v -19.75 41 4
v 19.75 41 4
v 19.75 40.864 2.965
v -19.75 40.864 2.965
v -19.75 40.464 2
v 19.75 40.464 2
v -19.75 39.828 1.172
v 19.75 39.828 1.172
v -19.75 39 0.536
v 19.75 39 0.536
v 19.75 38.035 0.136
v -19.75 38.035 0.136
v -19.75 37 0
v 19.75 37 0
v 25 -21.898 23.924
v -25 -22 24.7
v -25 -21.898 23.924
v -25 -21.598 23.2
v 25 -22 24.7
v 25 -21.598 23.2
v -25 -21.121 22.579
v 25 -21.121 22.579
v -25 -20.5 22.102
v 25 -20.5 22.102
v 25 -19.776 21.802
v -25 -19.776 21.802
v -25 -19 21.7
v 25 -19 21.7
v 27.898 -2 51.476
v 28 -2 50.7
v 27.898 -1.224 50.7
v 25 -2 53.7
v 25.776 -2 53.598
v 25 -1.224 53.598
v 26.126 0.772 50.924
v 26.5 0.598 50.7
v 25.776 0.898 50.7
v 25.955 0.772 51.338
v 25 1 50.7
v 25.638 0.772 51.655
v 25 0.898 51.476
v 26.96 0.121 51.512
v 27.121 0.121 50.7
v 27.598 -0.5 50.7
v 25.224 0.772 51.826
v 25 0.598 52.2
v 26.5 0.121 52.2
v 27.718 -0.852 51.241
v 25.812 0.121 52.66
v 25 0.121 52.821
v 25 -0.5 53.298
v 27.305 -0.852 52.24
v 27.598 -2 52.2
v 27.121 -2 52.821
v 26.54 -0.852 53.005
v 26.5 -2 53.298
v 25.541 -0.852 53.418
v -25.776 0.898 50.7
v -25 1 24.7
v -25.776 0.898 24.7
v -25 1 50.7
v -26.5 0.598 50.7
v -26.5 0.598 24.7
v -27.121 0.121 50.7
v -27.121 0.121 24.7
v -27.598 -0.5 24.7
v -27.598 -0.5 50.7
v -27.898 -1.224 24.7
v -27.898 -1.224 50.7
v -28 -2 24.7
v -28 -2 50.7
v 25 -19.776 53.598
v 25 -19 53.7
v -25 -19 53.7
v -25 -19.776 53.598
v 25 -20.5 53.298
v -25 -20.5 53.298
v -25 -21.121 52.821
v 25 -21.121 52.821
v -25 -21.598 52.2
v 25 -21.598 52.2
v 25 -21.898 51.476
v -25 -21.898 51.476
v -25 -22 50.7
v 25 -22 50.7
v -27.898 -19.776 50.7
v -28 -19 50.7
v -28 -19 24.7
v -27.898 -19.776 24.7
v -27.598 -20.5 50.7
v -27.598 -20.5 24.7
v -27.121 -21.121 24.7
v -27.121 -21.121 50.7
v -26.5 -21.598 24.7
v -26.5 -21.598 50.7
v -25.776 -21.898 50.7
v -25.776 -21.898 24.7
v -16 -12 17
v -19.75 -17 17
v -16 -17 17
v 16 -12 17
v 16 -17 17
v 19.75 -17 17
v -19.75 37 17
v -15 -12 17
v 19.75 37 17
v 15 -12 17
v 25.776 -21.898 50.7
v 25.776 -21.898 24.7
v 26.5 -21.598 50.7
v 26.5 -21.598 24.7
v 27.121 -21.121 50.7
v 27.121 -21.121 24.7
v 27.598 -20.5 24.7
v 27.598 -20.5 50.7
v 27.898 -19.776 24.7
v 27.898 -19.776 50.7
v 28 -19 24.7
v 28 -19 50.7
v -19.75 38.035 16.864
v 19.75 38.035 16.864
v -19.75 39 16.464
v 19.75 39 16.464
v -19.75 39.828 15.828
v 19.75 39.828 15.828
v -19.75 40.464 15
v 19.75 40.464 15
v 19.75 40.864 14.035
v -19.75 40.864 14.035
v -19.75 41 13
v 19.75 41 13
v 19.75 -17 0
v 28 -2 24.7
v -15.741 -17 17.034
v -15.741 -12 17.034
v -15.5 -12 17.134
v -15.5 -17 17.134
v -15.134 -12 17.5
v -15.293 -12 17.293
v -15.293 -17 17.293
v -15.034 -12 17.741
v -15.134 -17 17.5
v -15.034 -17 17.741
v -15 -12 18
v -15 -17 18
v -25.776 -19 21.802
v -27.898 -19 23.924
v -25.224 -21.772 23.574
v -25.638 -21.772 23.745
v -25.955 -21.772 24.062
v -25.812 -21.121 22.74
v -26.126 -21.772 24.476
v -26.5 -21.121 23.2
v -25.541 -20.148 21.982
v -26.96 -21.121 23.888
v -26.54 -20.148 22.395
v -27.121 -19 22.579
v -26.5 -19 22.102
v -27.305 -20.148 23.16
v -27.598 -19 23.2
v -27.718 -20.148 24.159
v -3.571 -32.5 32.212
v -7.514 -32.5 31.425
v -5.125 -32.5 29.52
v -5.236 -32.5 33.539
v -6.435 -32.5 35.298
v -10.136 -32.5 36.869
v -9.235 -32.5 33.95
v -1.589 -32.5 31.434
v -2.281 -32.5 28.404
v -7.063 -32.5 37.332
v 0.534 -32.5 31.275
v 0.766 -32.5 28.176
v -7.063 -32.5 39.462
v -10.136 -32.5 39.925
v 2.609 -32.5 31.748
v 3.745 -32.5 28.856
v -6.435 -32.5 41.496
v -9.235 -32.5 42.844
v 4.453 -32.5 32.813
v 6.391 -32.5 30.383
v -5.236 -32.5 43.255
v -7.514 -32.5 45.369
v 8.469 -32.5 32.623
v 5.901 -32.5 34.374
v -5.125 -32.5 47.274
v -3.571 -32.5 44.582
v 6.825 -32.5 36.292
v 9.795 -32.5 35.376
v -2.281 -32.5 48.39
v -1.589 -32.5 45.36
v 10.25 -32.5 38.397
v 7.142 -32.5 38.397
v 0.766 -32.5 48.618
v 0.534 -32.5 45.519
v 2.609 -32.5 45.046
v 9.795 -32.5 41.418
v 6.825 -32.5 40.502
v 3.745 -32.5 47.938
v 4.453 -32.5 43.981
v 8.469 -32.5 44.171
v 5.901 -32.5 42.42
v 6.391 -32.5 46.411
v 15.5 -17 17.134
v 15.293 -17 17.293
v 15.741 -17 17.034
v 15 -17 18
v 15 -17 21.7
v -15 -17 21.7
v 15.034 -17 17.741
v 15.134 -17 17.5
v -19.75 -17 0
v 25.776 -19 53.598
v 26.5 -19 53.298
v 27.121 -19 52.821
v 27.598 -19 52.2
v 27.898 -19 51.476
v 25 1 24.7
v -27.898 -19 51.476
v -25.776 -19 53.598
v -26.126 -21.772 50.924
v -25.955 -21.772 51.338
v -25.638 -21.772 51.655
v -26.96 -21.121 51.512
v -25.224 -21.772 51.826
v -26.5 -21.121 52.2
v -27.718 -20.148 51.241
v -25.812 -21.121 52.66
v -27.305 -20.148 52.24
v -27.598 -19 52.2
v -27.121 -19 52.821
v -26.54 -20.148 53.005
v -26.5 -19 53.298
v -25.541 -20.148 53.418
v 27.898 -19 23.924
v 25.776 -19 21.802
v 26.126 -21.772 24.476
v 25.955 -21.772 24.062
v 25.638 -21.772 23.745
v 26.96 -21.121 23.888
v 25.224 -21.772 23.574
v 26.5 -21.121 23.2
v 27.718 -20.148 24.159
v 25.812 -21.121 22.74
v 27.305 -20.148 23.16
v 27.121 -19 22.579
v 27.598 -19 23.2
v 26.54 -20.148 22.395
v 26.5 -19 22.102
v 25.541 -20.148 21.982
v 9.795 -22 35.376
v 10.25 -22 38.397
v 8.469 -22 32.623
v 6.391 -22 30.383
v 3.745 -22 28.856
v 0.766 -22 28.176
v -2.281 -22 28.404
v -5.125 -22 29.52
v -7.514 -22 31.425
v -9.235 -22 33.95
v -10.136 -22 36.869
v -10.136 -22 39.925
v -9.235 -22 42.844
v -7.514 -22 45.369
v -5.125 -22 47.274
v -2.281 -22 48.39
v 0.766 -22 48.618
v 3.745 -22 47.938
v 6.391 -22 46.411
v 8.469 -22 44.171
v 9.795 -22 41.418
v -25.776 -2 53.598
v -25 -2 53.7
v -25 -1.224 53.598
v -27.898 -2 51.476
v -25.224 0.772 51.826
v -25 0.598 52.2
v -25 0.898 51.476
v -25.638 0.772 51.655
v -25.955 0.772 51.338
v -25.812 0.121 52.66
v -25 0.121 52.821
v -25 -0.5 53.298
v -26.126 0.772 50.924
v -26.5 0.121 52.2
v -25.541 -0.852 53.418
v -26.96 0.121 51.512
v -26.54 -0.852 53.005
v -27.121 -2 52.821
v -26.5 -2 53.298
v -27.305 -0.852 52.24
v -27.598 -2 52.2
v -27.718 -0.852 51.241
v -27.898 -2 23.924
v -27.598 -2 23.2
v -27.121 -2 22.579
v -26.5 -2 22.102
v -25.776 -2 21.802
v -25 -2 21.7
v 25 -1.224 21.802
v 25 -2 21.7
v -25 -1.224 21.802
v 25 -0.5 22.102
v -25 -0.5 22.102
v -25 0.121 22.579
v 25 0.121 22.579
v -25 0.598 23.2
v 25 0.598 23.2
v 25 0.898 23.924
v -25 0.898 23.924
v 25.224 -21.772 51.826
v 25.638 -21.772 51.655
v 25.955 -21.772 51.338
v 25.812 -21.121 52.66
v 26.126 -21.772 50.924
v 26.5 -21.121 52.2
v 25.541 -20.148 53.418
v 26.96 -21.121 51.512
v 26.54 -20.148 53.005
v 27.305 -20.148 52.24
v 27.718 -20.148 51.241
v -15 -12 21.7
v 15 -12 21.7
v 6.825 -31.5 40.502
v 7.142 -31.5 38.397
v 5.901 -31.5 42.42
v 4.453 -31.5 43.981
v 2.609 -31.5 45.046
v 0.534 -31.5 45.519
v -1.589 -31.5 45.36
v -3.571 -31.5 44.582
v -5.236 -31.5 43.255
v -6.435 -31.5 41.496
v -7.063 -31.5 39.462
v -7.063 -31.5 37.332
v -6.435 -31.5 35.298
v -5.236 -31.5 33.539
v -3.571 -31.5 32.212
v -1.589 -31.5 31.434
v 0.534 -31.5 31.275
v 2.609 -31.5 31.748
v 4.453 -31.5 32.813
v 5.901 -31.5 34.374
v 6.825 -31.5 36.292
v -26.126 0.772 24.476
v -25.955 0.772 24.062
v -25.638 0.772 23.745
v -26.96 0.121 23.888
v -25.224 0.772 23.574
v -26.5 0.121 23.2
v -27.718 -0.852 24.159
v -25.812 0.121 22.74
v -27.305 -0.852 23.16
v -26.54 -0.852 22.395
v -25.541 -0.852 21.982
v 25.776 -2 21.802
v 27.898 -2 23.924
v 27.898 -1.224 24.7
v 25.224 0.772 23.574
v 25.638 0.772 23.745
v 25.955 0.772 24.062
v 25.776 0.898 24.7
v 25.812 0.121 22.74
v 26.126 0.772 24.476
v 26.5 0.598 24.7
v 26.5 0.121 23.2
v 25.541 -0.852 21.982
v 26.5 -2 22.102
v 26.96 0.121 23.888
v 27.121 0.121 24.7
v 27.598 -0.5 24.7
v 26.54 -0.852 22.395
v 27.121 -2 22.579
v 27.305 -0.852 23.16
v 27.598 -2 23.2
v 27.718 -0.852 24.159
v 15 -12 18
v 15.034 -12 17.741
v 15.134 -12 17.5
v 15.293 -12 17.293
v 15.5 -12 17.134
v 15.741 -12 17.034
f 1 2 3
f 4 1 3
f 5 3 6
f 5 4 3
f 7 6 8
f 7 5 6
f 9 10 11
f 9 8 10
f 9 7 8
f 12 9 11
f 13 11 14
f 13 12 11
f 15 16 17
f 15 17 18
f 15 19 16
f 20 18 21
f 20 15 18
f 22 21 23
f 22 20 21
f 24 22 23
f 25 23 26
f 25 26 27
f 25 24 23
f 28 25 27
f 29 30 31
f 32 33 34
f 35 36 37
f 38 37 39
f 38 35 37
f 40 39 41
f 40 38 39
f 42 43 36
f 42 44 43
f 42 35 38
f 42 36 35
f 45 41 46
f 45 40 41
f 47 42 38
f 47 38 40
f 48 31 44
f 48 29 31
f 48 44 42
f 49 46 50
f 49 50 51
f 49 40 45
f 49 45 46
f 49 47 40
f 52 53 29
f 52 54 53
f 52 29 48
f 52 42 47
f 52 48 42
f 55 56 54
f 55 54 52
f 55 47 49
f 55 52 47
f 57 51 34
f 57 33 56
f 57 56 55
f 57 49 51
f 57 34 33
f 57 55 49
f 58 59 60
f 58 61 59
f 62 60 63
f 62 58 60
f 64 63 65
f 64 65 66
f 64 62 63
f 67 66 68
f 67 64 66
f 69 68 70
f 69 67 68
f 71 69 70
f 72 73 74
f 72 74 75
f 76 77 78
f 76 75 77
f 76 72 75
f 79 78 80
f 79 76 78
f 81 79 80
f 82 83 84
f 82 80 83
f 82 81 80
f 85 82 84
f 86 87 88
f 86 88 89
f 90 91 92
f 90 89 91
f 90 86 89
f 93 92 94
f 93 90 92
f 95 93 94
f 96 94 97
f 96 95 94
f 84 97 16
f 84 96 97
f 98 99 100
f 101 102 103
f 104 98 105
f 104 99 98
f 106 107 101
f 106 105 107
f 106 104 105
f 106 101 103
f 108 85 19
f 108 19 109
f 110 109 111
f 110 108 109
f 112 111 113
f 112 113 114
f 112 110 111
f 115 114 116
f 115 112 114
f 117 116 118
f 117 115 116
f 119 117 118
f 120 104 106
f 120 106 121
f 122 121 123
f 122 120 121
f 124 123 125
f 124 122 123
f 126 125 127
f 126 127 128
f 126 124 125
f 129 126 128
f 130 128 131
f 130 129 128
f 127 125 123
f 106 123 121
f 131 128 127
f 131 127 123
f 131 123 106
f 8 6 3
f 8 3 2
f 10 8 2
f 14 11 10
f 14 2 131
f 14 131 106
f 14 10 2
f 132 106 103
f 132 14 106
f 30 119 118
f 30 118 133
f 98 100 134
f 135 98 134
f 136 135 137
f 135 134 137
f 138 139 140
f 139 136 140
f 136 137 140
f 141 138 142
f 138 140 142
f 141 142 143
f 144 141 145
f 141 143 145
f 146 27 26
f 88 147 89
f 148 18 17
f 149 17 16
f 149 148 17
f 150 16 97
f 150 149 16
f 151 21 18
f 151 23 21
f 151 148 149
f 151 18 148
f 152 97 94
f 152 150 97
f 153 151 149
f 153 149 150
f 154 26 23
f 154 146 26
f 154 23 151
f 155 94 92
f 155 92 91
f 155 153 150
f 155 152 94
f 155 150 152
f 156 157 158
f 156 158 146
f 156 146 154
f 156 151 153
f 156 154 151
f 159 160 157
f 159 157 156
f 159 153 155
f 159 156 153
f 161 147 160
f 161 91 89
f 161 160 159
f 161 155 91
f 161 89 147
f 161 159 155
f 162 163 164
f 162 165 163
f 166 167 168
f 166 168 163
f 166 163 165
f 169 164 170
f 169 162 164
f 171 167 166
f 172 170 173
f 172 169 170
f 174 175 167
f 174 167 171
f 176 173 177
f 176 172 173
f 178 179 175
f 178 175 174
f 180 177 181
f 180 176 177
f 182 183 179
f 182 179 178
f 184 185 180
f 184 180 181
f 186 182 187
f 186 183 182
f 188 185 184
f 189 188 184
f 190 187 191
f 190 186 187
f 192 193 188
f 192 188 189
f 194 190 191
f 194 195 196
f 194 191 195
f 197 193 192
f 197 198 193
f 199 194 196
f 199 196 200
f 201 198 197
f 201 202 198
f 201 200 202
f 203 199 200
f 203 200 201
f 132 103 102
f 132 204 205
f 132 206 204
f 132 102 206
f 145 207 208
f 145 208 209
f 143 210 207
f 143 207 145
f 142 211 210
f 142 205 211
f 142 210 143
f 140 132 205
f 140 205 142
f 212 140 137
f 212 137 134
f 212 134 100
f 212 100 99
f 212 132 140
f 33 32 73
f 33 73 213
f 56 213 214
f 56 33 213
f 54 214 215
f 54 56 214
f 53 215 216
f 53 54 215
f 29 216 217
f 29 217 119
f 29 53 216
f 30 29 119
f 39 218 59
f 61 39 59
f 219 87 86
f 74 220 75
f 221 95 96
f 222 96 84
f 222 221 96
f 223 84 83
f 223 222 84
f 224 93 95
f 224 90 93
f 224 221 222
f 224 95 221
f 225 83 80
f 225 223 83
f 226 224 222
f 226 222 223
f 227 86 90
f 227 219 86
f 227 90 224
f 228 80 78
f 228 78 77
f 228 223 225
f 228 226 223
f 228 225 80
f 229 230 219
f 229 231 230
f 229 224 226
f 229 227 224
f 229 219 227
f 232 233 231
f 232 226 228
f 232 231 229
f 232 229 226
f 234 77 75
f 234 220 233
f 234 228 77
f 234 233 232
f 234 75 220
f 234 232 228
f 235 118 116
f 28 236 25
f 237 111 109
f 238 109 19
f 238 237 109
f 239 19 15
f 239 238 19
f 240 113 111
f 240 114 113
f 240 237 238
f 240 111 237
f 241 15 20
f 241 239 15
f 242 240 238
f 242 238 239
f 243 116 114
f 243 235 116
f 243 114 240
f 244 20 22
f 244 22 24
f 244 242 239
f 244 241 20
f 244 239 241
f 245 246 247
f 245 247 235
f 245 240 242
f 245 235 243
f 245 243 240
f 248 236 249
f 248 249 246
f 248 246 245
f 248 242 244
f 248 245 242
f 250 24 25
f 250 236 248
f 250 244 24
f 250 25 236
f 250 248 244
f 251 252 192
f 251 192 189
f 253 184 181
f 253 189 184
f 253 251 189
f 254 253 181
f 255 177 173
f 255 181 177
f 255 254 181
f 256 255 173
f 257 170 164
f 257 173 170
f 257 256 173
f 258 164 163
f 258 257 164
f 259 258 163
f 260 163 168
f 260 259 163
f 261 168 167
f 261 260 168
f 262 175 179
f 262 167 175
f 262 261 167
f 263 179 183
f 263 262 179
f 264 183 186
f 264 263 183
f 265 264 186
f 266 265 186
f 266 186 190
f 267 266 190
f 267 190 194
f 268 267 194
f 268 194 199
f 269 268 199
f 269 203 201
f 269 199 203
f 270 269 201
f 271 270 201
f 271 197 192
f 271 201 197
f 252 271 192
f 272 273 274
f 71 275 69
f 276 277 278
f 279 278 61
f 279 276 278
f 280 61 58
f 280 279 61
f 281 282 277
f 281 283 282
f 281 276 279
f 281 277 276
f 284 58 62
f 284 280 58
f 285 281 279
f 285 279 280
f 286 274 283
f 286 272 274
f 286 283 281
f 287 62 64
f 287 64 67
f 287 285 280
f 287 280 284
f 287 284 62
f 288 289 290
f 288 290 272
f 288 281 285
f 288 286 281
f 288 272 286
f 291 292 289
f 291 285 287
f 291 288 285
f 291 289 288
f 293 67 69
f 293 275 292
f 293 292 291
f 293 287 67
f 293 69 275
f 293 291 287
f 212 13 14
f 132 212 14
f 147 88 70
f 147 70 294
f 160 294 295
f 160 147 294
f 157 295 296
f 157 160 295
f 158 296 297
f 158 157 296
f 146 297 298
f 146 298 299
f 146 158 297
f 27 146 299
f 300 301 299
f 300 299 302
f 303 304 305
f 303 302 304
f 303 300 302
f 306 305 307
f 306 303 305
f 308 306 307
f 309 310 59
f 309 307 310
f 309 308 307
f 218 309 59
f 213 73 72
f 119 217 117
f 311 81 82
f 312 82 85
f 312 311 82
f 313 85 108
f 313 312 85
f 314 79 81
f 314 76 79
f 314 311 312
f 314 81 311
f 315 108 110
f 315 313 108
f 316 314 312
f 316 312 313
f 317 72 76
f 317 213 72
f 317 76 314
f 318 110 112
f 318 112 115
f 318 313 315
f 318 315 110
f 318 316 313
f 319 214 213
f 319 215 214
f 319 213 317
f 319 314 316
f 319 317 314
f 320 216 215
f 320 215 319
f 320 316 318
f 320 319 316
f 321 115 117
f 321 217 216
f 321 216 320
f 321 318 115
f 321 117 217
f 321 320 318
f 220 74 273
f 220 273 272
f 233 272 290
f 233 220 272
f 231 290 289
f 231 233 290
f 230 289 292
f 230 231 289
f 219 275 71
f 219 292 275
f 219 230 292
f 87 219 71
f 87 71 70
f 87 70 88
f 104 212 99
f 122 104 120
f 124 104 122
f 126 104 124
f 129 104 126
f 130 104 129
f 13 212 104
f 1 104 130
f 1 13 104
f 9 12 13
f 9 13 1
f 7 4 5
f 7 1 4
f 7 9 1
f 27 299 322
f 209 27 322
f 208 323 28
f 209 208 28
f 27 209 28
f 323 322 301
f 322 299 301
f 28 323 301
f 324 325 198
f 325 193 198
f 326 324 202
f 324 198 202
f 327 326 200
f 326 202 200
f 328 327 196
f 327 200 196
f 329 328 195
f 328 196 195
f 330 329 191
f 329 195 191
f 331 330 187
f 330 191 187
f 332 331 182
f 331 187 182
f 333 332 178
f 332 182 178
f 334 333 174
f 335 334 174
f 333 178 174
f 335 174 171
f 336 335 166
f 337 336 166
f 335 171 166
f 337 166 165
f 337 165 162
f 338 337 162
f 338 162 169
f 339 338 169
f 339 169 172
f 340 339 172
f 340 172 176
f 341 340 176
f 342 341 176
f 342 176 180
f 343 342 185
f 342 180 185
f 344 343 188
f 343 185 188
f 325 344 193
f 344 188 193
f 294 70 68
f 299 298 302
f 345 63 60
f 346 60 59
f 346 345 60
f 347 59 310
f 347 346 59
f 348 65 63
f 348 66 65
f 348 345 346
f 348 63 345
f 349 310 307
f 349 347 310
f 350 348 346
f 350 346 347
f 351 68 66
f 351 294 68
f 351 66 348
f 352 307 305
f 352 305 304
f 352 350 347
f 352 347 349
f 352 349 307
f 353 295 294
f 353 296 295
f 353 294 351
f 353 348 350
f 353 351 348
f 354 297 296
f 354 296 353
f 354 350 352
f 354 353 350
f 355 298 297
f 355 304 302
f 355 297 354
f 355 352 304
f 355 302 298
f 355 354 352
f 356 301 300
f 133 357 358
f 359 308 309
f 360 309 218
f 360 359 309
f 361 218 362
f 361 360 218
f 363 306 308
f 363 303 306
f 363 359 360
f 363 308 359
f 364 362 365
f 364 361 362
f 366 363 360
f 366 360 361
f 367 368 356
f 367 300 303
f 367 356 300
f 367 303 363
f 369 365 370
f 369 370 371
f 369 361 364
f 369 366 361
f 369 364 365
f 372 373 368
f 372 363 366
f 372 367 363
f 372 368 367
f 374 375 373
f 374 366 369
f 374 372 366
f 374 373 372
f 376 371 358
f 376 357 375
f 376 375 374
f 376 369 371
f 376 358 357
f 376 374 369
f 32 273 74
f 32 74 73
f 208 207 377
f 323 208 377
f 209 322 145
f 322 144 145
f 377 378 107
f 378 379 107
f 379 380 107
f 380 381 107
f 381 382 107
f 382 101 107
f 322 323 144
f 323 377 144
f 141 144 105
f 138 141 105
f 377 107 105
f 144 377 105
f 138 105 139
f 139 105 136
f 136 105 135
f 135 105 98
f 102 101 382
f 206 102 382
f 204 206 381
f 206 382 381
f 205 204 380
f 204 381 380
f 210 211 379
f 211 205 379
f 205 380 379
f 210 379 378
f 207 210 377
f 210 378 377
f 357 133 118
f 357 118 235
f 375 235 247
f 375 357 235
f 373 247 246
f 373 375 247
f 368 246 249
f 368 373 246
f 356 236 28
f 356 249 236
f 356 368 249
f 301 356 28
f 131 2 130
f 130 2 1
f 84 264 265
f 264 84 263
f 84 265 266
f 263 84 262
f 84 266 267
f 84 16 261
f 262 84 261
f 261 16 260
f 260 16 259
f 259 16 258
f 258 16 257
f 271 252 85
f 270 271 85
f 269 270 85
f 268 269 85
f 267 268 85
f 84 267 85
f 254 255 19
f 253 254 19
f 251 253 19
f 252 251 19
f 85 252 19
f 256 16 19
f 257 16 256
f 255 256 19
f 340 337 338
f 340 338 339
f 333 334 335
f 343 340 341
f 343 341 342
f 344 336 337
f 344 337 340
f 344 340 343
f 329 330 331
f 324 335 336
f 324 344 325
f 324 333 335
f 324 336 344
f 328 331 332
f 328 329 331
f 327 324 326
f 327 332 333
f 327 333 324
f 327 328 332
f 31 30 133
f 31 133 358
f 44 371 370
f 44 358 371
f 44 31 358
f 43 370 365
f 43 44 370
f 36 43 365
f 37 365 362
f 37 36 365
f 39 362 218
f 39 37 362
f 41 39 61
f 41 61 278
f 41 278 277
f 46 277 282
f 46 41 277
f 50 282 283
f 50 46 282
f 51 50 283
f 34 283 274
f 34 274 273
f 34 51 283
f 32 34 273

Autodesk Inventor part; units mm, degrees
ref_plane "YZ Plane" through (0, 0, 0) normal (1, 0, 0) x (0, 1, 0)
ref_plane "XZ Plane" through (0, 0, 0) normal (0, 1, 0) x (-1, 0, 0)
ref_plane "XY Plane" through (0, 0, 0) normal (0, 0, 1) x (1, 0, 0)
sketch "Sketch1" plane through (0, 0, 0) normal (0, 0, 1) x (1, 0, 0)
  circle A0 centre (0, 17) radius 3.1 projected
  line L0 (19.75, -8) -> (-19.75, -8) projected
  line L1 (19.75, 33) -> (19.75, -8) projected
  line L2 (-19.75, 33) -> (19.75, 33) projected
  line L3 (-19.75, -8) -> (-19.75, 33) projected
  line L4 (-19.75, -8) -> (19.75, -8)
  line L5 (19.75, -8) -> (19.75, -17)
  line L6 (19.75, -17) -> (-19.75, -17)
  line L7 (-19.75, -17) -> (-19.75, -8)
  line L8 (-19.75, 33) -> (19.75, 33)
  line L9 (19.75, 33) -> (19.75, 41)
  line L10 (19.75, 41) -> (-19.75, 41)
  line L11 (-19.75, 41) -> (-19.75, 33)
  line L12 (-19.75, -10) -> (19.75, -10) projected
  point P0 (0, 0)
  dimension "d0" = 7
  dimension "d1" = 8
extrude "Extrusion1" add sketch "Sketch1" along normal blind 17 contours A0 | L5 L12 L7 L0 | L0 L3 L2 L1 | L2 L11 L10 L9 | L5 L6 L7 L12
sketch "Sketch2" plane through (0, 0, 17) normal (0, 0, 1) x (1, 0, 0)
  line L0 (-19.75, -17) -> (19.75, -17) projected
  line L1 (-15, -17) -> (15, -17)
  line L2 (15, -17) -> (15, -12)
  line L3 (15, -12) -> (-15, -12)
  line L4 (-15, -12) -> (-15, -17)
  line L5 (0, 0) -> (0, 11.2749)
  point P0 (0, -12)
  dimension "d4" = 30
  dimension "d5" = 5
extrude "Extrusion2" add sketch "Sketch2" along normal blind 4.7
sketch "Sketch3" plane through (0, 0, 21.7) normal (0, 0, 1) x (1, 0, 0)
  line L0 (-15, -17) -> (15, -17) projected
  line L1 (15, -17) -> (15, -12) projected
  line L2 (15, -12) -> (-15, -12) projected
  line L3 (-15, -12) -> (-15, -17) projected
  line L4 (-28, -22) -> (28, -22)
  line L5 (28, -22) -> (28, 1)
  line L6 (28, 1) -> (-28, 1)
  line L7 (-28, 1) -> (-28, -22)
  line L8 (0, 0) -> (0, 8.1393)
  point P0 (0, 1)
  dimension "d8" = 56
  dimension "d9" = 23
  dimension "d10" = 5
extrude "Extrusion3" add sketch "Sketch3" along normal blind 32 contours L3 L2 L1 L0 | L7 L6 L5 L4
sketch "Sketch4" plane through (-28, -22, 21.7) normal (0, -1, 0) x (1, 0, 0)
  circle A0 centre (28, 16.697) radius 10.25
  point P0 (28, -21.7)
  dimension "d13" = 20.5
extrude "Extrusion4" add sketch "Sketch4" along normal blind 10.5
fillet "Fillet1" radius 3 12 edges at (-28, -10.5, 53.7) (28, -10.5, 53.7) (28, -10.5, 21.7) (-28, -10.5, 21.7) (-28, -22, 37.7) (0, -22, 21.7) (0, -22, 53.7) (28, -22, 37.7) (28, 1, 37.7) (-28, 1, 37.7) (0, 1, 53.7) (0, 1, 21.7)
sketch "Sketch5" plane through (0, -32.5, 38.397) normal (0, -1, 0) x (1, 0, 0)
  circle A0 centre (0, 0) radius 10.25 projected
  circle A1 centre (0, 0) radius 7.1424
  point P0 (0, -38.397)
extrude "Extrusion5" cut sketch "Sketch5" against normal blind 1 contours A1
fillet "Fillet2" radius 1 2 edges at (15, -14.5, 17) (-15, -14.5, 17)
fillet "Fillet3" radius 4 2 edges at (0, 41, 0) (0, 41, 17)
properties part number "DK2 Camera"
